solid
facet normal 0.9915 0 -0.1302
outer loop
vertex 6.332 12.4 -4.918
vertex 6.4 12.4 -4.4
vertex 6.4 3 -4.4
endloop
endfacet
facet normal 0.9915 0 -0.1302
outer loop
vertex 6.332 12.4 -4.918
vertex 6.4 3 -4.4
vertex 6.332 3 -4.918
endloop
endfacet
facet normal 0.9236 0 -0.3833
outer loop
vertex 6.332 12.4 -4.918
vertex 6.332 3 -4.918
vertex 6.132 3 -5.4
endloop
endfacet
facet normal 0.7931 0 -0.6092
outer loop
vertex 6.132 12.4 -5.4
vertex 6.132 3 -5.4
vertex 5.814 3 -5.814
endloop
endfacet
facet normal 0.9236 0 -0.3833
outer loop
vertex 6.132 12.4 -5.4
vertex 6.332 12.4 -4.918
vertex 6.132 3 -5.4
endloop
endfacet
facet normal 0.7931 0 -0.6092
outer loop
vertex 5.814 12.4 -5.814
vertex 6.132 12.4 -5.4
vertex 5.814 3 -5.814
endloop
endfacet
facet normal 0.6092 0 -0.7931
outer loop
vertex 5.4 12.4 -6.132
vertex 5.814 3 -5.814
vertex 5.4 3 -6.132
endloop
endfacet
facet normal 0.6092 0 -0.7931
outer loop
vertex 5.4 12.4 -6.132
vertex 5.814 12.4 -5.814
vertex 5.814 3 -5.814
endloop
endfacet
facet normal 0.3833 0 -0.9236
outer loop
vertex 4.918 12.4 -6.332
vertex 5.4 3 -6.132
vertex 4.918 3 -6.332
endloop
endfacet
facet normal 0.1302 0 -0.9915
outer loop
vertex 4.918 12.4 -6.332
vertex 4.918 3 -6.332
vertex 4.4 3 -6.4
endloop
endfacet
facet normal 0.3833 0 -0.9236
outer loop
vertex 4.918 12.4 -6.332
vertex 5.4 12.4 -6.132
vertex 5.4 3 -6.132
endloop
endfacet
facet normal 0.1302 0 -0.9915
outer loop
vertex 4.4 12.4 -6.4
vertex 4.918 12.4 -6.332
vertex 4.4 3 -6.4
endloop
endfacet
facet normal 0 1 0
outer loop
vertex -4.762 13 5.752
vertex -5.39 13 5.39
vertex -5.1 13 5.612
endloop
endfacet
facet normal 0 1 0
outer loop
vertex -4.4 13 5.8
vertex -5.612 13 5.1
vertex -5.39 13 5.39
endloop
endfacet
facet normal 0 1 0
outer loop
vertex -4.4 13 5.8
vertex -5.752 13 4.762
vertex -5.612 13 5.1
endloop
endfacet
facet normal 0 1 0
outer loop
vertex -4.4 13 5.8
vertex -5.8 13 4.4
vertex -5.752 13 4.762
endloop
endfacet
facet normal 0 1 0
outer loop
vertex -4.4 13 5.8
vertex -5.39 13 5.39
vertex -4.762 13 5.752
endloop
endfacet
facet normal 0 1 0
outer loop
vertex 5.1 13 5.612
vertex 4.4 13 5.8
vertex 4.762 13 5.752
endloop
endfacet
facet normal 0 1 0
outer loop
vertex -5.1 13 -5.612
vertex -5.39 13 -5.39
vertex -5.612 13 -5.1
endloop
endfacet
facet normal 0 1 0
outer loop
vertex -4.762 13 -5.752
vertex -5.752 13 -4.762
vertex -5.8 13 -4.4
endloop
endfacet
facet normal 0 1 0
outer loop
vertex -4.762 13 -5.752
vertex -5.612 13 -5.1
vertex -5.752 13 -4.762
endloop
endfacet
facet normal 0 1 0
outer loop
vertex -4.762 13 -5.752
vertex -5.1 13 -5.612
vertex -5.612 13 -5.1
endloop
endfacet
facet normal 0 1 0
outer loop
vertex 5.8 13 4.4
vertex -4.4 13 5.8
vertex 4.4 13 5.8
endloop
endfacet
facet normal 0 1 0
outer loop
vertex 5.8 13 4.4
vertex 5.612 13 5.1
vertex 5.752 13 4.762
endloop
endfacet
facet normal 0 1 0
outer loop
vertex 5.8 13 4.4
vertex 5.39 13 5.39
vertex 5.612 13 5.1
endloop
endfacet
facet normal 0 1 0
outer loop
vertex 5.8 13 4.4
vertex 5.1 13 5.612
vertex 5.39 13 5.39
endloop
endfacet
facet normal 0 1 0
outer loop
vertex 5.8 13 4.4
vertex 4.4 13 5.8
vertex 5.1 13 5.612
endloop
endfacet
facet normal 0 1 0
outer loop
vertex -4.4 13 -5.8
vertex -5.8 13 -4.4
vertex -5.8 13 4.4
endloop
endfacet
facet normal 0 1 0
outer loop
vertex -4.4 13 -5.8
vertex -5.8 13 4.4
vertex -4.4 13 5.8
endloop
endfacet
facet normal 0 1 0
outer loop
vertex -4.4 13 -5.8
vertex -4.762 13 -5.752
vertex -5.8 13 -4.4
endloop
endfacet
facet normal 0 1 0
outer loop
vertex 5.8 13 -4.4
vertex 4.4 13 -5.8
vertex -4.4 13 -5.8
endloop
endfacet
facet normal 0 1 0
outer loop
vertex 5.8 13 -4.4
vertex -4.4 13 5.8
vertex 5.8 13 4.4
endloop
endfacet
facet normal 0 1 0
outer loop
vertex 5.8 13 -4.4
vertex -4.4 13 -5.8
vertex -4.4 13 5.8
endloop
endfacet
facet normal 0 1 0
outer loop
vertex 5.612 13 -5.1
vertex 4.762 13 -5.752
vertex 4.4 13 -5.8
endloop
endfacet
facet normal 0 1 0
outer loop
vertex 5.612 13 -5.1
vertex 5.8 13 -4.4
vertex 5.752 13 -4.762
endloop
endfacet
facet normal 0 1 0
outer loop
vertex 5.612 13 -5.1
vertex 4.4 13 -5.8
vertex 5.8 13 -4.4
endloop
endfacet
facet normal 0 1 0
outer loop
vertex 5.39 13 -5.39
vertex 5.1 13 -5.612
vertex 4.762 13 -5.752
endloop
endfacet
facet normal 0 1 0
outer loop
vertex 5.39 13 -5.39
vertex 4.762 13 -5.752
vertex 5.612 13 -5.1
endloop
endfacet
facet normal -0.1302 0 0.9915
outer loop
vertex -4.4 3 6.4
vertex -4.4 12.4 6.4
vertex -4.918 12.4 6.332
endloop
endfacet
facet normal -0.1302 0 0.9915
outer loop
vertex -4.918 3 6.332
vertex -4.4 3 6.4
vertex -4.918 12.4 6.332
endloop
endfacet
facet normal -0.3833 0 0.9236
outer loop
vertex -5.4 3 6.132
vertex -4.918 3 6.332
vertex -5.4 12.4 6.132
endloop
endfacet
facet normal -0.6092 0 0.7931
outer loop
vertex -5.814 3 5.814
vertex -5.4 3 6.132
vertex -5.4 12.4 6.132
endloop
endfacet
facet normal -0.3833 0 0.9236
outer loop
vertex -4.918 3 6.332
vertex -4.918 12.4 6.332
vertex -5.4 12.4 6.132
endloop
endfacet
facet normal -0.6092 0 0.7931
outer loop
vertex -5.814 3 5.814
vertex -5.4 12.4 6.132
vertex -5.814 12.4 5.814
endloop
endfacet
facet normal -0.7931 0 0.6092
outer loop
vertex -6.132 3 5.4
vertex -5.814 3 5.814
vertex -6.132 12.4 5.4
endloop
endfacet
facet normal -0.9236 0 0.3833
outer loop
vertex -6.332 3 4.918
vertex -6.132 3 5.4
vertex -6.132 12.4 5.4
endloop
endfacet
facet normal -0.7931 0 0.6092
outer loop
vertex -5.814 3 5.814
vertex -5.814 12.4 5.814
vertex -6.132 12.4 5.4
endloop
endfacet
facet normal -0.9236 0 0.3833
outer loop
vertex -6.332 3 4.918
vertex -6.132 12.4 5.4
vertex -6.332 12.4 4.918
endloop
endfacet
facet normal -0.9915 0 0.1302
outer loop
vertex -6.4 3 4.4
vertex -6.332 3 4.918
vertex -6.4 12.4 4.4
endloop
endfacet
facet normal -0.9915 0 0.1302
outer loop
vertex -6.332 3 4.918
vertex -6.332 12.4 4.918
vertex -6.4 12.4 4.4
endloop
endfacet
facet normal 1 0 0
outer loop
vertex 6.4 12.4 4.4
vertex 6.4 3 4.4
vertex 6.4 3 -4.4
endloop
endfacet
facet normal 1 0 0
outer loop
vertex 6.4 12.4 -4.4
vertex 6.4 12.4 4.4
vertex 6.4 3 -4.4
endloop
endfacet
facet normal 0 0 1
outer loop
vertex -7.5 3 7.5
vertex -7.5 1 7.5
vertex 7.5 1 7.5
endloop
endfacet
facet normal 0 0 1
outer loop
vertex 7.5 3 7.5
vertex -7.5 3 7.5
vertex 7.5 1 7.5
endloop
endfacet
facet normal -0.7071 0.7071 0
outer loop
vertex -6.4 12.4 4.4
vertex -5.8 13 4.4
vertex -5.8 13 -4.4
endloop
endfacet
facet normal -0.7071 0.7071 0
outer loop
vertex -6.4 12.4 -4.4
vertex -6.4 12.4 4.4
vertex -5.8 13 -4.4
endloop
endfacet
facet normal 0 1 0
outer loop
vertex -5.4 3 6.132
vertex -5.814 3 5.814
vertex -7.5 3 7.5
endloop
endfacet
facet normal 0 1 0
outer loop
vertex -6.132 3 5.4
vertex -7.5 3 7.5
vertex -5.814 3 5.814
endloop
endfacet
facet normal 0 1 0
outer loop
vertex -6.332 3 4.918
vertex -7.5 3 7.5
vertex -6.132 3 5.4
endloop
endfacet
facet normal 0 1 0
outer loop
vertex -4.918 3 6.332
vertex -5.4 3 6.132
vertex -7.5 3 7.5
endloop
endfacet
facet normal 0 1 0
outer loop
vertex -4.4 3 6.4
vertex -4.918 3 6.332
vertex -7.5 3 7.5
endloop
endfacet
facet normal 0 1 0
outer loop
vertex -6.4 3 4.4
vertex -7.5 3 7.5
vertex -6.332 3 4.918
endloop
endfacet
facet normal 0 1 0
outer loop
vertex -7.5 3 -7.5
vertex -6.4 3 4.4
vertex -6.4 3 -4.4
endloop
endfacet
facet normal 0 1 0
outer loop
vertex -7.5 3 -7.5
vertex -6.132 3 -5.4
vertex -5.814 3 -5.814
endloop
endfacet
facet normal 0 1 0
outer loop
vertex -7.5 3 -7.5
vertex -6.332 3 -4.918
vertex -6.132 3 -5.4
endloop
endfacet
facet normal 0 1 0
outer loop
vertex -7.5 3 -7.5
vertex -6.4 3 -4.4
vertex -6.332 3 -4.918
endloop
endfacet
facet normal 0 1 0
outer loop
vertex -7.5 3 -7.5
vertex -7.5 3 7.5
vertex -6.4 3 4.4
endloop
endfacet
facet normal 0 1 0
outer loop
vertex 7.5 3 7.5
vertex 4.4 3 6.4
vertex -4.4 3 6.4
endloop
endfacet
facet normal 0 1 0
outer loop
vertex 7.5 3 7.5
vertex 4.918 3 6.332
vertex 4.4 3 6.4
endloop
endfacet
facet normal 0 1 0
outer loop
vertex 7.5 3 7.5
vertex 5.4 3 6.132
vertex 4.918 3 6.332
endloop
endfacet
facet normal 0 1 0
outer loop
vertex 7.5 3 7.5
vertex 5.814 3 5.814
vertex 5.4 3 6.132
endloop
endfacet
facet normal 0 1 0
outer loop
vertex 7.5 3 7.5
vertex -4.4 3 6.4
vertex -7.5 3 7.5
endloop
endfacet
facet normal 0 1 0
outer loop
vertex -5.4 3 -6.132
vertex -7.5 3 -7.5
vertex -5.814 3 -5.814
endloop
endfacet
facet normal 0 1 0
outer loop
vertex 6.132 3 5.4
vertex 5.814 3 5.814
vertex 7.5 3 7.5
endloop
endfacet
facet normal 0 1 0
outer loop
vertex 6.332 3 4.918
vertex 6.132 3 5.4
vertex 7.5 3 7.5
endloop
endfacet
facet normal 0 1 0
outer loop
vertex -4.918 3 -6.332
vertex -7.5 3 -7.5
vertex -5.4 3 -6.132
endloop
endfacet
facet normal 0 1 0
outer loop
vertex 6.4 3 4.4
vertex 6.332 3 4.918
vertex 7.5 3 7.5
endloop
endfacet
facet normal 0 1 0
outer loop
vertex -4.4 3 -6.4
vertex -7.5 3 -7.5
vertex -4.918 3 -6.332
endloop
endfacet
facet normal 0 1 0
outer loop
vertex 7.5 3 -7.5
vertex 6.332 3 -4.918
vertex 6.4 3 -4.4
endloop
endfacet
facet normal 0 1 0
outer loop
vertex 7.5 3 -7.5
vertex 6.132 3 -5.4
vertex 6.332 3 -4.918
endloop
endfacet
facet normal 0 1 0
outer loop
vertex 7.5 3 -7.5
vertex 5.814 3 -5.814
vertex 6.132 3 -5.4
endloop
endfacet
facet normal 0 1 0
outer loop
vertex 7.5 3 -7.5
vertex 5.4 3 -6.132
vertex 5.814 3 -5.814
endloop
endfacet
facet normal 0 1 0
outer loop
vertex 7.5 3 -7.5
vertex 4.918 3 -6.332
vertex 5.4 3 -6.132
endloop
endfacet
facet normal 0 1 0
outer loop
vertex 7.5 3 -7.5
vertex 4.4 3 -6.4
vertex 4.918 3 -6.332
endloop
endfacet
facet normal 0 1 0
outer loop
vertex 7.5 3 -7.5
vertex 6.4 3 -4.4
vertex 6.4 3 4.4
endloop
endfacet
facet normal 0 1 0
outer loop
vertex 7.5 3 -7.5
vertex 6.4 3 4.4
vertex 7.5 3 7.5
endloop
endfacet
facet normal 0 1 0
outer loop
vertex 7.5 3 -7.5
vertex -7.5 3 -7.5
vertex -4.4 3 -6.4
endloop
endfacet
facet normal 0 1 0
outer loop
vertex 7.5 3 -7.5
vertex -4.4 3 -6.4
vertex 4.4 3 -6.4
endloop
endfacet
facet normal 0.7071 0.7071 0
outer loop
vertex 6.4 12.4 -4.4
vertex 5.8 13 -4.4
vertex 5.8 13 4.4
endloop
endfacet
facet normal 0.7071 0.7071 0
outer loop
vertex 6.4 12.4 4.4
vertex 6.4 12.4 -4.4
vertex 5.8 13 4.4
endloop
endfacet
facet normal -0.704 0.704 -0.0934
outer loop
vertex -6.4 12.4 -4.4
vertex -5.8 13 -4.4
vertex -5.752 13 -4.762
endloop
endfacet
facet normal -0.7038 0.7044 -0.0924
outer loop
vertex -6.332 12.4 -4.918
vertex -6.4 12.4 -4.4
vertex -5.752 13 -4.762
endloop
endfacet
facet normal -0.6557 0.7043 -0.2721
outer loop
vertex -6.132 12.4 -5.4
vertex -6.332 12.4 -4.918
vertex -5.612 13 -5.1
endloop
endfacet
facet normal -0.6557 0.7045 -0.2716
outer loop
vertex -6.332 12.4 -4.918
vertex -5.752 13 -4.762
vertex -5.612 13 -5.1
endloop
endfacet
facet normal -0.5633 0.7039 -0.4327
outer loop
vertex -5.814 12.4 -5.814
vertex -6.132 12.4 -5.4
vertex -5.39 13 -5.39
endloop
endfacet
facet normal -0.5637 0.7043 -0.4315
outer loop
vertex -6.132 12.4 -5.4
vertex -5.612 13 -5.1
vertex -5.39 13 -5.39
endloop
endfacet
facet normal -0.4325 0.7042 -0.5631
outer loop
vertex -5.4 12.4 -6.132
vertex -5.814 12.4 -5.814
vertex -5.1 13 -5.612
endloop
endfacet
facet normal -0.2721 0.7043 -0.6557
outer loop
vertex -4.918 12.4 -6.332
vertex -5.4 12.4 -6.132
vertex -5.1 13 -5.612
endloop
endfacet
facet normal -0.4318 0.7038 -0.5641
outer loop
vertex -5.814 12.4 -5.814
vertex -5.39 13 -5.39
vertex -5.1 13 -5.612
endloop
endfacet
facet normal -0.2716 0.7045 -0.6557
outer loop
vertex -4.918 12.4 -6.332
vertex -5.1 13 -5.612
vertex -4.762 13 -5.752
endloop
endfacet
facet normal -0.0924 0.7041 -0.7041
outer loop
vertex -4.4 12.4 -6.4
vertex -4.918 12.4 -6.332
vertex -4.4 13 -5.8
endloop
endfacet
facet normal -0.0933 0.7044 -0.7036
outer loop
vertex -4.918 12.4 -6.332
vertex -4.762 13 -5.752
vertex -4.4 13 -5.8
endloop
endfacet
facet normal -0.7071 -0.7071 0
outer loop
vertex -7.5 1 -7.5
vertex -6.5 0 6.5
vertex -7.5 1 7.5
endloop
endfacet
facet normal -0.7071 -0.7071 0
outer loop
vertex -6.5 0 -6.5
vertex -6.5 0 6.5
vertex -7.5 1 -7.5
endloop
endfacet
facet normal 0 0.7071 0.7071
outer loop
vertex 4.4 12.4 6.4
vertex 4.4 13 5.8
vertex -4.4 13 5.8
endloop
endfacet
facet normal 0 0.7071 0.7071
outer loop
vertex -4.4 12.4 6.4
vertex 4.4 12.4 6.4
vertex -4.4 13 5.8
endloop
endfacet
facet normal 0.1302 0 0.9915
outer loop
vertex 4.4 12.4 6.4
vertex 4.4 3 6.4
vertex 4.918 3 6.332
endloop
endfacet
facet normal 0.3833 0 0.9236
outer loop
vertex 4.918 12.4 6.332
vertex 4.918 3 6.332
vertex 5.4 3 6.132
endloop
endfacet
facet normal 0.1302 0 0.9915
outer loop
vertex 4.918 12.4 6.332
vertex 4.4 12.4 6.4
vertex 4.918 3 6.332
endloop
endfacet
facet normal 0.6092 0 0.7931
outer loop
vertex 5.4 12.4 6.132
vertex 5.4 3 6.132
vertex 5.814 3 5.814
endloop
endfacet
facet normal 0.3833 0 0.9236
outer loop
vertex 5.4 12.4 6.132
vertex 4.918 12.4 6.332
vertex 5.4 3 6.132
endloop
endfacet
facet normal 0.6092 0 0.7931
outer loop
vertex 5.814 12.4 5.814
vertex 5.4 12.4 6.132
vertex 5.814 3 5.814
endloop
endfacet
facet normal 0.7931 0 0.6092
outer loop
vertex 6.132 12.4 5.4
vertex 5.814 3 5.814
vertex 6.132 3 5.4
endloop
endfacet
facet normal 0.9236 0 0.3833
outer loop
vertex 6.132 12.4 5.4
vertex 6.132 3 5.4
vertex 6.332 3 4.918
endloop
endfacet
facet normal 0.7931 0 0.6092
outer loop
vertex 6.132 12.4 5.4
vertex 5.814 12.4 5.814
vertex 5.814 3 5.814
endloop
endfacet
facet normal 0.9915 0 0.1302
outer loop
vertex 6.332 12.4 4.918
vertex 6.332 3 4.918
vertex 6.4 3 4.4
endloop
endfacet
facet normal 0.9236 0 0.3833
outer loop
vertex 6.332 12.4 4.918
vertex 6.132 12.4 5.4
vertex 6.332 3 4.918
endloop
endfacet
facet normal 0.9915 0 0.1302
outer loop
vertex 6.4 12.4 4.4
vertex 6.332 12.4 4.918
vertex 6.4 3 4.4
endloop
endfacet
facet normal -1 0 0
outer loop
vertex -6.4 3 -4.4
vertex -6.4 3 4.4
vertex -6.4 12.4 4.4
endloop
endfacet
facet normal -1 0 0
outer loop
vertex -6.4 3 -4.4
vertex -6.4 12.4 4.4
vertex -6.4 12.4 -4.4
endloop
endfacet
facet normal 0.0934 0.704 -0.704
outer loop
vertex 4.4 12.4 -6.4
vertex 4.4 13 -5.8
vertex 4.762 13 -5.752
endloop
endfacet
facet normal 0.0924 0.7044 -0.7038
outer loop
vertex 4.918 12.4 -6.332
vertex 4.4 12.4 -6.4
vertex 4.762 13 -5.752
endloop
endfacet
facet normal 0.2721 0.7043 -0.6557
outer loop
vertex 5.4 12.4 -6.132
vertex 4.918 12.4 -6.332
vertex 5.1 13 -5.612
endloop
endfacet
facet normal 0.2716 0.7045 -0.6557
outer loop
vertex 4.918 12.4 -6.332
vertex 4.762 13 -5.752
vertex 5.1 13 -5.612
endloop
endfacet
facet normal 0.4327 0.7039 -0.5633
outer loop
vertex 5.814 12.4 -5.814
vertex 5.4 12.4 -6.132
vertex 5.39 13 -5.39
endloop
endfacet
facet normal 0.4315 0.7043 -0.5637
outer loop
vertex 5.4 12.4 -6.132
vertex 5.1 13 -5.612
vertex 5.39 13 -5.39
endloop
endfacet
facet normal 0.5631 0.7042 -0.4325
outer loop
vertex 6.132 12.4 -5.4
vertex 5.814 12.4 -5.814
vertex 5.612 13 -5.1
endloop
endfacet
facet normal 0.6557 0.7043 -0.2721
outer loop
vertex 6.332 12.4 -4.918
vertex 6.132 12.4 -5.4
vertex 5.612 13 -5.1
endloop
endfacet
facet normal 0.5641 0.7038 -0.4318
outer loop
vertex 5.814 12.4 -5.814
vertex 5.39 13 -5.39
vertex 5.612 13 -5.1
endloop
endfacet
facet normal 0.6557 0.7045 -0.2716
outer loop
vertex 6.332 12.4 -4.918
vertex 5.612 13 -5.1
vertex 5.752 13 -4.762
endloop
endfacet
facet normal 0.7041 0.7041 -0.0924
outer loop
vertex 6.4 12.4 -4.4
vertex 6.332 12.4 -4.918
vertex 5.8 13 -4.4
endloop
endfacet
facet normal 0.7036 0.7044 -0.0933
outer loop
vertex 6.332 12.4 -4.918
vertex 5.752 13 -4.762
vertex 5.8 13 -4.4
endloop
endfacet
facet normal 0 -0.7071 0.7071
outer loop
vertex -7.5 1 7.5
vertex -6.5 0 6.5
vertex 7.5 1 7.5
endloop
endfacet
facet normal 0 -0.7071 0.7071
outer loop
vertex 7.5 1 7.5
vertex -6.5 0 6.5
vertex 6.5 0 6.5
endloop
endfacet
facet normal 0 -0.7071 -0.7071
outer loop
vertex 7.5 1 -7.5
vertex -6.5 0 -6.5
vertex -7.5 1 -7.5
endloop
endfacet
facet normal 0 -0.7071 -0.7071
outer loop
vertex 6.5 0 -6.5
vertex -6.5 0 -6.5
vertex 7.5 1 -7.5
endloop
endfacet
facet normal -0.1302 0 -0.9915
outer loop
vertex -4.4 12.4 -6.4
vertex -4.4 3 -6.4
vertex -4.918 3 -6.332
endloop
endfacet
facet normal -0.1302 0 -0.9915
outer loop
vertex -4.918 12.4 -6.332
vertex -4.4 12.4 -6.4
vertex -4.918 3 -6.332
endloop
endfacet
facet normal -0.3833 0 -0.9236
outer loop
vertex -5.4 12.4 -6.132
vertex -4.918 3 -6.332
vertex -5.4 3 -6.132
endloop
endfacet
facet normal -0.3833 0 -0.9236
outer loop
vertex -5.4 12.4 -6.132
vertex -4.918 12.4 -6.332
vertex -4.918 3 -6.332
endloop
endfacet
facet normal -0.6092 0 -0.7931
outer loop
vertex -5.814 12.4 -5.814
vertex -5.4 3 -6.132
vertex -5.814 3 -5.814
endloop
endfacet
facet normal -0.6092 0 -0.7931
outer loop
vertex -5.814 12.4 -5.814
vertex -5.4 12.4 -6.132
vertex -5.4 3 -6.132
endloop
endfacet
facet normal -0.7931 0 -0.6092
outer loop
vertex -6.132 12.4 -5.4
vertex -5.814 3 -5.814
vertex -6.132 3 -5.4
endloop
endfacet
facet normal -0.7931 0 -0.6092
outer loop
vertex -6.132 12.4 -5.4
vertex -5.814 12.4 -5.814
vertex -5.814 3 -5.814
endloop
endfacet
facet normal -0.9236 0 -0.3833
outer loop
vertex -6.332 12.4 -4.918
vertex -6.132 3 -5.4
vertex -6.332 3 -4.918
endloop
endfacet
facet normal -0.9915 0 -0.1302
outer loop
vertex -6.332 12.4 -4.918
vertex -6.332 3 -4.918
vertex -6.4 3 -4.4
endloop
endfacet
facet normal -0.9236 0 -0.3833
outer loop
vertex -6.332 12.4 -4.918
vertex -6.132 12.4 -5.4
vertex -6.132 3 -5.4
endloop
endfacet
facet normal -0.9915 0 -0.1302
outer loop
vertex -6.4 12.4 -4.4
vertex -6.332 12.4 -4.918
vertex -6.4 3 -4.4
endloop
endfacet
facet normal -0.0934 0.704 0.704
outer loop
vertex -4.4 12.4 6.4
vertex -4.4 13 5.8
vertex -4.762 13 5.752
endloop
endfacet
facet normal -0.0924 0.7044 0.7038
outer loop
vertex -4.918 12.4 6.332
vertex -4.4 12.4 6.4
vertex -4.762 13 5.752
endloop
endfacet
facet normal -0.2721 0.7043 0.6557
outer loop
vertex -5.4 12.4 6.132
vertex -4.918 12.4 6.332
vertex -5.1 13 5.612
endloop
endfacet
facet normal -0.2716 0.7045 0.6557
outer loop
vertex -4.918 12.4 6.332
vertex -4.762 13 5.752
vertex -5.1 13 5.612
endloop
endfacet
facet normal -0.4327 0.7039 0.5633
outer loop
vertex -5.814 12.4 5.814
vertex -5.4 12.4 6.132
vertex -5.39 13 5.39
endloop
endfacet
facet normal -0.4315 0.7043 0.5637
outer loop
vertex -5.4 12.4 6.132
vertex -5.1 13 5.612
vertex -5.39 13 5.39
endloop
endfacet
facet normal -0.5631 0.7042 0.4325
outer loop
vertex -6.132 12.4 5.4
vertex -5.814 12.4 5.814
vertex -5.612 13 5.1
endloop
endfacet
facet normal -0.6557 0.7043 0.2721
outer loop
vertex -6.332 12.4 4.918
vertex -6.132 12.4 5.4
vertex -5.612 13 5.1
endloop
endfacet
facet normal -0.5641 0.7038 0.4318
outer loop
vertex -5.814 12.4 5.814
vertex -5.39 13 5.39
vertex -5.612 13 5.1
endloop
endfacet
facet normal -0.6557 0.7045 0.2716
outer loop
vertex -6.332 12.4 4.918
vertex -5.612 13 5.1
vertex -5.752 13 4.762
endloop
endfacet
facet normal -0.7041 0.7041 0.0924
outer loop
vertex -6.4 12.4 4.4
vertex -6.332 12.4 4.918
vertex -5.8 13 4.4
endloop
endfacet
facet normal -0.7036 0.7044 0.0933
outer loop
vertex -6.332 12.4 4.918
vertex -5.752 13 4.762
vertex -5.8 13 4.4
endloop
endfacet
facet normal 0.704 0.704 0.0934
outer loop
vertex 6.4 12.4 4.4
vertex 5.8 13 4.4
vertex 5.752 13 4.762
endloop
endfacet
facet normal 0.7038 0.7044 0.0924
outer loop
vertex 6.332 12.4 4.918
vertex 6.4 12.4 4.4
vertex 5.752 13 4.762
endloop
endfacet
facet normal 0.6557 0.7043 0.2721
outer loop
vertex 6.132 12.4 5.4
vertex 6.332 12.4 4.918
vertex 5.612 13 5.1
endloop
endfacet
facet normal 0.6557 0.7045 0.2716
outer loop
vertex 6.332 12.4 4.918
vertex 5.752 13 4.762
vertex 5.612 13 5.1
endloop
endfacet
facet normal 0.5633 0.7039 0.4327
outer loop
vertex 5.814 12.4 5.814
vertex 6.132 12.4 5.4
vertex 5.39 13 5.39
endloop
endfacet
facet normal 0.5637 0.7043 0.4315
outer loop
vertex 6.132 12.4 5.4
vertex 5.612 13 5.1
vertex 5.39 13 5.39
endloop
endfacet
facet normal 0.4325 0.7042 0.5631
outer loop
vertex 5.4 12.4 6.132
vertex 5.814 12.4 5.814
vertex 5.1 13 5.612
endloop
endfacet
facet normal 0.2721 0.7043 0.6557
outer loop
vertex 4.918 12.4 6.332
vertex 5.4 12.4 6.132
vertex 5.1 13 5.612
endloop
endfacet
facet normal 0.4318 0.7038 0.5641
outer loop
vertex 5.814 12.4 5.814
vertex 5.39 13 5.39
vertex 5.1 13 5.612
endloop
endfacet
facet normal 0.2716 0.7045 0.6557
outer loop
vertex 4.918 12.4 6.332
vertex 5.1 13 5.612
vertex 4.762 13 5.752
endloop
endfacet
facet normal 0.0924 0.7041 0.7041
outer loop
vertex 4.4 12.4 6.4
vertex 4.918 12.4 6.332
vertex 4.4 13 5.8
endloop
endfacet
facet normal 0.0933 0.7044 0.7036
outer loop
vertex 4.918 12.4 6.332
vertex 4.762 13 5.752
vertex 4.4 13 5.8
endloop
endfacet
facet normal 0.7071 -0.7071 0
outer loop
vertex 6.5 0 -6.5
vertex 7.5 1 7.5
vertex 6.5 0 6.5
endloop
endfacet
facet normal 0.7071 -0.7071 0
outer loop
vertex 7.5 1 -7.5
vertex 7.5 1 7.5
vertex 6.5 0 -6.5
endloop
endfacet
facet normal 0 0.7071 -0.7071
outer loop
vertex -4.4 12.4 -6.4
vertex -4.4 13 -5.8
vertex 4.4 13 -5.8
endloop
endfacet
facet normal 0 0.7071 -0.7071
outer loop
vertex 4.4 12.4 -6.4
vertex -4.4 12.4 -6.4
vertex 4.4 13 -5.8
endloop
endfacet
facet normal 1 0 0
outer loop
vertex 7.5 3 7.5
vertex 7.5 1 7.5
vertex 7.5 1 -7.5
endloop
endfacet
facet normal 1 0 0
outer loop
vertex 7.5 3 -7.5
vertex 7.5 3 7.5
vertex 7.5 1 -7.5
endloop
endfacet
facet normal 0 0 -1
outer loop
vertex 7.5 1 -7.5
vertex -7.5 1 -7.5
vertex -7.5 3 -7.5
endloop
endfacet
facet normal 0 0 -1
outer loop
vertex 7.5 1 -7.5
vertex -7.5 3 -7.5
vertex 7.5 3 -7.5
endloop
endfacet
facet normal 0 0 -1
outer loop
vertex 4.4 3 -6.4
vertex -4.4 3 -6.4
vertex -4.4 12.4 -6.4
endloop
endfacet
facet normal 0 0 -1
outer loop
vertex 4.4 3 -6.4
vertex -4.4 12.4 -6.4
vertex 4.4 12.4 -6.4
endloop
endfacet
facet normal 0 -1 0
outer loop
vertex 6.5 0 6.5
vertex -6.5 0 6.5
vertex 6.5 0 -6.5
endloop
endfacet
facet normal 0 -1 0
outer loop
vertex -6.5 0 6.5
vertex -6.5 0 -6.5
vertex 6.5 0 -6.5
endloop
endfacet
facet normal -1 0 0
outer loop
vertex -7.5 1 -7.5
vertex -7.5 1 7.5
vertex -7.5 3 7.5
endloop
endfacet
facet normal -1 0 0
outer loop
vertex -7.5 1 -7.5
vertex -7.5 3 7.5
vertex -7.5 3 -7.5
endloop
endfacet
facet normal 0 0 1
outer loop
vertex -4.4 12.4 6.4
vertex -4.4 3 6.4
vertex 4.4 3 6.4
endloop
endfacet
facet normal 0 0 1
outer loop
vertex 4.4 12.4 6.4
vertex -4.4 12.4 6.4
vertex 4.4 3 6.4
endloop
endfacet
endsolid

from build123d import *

# Parameters (mm, degrees)
SKETCH_1_W      = 15
SKETCH_1_H      = 15
EXTRUDE_1_DEPTH = 3
SKETCH_2_W      = 12.8
SKETCH_2_H      = 12.8
EXTRUDE_2_DEPTH = 10
CHAMFER_1_SIZE  = 1
FILLET_1_R      = 2
CHAMFER_2_SIZE  = 0.6


with BuildPart() as part:
    # 草图1 → 凸台-拉伸1 (new body)
    with BuildSketch(Plane(origin=(0, 0, 0), x_dir=(1, 0, 0), z_dir=(0, 1, 0))):
        Rectangle(SKETCH_1_W, SKETCH_1_H)
    extrude(amount=EXTRUDE_1_DEPTH)

    # 草图2 → 凸台-拉伸2 (add)
    with BuildSketch(Plane(origin=(0, 3, 0), x_dir=(1, 0, 0), z_dir=(0, 1, 0))):
        Rectangle(SKETCH_2_W, SKETCH_2_H)
    extrude(amount=EXTRUDE_2_DEPTH)

    # 倒角1
    chamfer_1_edges = [part.edges().sort_by_distance(p)[0] for p in [
        (0, 0, 7.5),
        (-7.5, 0, 0),
        (0, 0, -7.5),
        (7.5, 0, 0),
    ]]
    chamfer(chamfer_1_edges, length=CHAMFER_1_SIZE)

    # 圆角1
    fillet_1_edges = [part.edges().sort_by_distance(p)[0] for p in [
        (6.4, 8, 6.4),
        (6.4, 8, -6.4),
        (-6.4, 8, -6.4),
        (-6.4, 8, 6.4),
    ]]
    fillet(fillet_1_edges, radius=FILLET_1_R)

    # 倒角2
    chamfer_2_edges = [part.edges().sort_by_distance(p)[0] for p in [
        (0, 13, -6.4),
        (6.4, 13, 0),
        (-6.4, 13, 0),
        (0, 13, 6.4),
        (5.814213562, 13, 5.814213562),
        (-5.814213562, 13, 5.814213562),
        (-5.814213562, 13, -5.814213562),
        (5.814213562, 13, -5.814213562),
    ]]
    chamfer(chamfer_2_edges, length=CHAMFER_2_SIZE)


solid = part.part
